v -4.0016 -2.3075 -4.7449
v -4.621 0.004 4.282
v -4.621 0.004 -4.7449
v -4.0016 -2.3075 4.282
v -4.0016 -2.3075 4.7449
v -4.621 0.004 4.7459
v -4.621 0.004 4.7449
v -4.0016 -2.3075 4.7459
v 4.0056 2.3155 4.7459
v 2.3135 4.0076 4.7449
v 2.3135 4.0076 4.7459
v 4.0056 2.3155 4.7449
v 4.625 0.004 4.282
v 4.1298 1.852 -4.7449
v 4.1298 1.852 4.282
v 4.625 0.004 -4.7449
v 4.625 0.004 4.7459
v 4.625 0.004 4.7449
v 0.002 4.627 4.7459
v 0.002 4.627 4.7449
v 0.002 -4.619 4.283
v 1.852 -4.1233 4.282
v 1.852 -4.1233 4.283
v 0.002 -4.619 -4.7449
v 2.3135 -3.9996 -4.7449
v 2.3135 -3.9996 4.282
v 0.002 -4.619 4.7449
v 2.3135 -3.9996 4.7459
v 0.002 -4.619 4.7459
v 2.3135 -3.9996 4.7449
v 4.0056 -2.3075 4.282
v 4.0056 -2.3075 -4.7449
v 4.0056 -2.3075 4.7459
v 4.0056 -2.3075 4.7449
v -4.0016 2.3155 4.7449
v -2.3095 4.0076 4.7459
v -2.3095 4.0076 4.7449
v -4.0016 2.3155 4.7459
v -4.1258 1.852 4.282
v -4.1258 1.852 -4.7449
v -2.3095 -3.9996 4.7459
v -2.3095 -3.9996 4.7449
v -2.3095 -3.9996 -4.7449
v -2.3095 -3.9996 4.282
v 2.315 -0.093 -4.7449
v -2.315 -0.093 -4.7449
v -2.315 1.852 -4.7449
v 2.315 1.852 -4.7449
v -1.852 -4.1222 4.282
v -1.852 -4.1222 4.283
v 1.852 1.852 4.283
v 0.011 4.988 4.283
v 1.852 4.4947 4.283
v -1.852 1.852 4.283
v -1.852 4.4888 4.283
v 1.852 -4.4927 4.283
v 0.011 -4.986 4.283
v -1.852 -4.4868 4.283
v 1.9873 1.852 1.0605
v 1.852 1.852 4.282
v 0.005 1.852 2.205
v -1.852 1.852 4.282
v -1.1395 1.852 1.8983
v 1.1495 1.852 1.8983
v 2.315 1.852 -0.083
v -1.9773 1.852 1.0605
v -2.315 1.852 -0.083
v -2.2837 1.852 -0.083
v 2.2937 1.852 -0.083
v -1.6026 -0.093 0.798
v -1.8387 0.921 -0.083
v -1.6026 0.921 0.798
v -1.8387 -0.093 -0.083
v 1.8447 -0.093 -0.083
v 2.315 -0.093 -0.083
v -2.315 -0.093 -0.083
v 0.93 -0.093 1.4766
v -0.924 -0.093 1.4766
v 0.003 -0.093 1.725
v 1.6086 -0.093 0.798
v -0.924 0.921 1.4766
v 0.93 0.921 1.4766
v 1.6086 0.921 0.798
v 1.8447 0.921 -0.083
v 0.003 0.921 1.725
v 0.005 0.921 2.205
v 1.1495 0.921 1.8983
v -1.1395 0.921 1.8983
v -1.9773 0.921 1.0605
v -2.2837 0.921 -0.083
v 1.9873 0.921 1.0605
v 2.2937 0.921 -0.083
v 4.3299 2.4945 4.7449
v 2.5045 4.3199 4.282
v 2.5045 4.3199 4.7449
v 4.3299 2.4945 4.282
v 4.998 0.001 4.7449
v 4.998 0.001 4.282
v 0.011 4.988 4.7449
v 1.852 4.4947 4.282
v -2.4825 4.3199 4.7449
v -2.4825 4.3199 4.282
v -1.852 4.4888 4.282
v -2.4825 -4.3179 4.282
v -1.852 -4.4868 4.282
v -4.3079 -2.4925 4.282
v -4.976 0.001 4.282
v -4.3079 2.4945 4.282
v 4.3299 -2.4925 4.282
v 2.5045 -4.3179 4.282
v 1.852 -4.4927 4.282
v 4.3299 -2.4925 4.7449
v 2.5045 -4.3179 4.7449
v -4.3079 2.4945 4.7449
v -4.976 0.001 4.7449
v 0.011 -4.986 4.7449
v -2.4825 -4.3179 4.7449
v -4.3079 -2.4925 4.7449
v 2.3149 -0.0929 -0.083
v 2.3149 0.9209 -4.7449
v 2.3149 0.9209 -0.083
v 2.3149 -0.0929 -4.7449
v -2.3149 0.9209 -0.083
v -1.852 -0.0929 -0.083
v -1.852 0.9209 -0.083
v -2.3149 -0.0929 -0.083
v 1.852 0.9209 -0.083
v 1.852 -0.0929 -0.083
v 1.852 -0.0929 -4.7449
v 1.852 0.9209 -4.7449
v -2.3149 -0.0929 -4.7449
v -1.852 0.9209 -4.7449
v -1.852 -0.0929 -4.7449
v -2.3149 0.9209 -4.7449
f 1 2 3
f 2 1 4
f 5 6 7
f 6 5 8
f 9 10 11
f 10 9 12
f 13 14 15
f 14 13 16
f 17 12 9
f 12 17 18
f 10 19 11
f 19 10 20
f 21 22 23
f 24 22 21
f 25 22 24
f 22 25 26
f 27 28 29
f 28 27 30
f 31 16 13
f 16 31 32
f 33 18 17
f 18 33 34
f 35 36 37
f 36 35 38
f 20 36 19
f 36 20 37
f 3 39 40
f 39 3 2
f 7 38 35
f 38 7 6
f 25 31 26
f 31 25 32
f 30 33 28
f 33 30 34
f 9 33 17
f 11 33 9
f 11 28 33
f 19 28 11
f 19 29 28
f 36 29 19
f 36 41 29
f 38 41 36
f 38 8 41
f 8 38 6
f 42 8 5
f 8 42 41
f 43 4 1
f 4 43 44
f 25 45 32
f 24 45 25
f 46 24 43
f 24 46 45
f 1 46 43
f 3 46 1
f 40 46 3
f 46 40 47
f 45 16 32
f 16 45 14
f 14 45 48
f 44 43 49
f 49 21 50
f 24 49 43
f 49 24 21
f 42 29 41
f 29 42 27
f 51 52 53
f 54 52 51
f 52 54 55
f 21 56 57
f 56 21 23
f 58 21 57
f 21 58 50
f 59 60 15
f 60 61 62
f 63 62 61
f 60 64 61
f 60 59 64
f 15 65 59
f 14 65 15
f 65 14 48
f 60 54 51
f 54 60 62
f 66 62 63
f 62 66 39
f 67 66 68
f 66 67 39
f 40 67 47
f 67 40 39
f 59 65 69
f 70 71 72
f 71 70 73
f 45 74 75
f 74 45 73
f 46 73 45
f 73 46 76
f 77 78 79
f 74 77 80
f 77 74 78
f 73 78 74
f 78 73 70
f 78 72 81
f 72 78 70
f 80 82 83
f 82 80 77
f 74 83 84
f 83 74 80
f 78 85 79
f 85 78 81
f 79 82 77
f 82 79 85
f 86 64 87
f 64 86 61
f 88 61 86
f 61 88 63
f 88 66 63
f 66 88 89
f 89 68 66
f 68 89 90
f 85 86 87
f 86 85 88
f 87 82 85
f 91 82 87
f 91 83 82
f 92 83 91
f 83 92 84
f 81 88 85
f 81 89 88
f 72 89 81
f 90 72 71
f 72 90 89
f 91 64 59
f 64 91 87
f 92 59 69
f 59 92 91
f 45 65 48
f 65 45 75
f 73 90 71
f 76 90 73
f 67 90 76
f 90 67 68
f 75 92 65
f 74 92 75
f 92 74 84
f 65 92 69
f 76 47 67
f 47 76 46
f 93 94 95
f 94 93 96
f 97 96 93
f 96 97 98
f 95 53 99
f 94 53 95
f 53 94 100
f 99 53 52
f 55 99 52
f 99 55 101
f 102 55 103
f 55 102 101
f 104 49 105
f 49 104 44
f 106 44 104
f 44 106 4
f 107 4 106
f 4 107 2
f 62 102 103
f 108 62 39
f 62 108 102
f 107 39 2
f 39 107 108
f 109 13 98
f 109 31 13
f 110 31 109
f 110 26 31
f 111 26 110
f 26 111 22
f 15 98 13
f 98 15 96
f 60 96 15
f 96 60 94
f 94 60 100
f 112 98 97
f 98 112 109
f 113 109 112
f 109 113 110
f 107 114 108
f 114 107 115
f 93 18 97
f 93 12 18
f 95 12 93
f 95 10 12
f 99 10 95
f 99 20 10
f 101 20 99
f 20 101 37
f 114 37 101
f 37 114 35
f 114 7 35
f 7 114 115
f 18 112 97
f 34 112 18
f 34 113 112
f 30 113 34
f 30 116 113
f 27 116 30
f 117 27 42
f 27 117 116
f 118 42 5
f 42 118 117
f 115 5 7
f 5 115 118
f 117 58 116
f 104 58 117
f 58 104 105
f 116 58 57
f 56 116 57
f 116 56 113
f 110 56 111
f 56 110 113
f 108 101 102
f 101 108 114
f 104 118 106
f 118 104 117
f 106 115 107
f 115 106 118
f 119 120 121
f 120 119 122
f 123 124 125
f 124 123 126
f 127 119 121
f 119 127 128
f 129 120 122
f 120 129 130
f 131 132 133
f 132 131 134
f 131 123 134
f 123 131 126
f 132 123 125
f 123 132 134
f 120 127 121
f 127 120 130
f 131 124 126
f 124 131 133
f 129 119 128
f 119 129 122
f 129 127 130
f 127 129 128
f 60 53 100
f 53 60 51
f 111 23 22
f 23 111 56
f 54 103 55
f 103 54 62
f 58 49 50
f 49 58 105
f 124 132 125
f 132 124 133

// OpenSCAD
intersection() {
  translate([0, 0, 0.0005])
  cube(size = [11.9999, 11.9999, 11.3889], center = true);

  union() {
    difference() {
      difference() {
        translate([0.002, 0.004, 0.0005])
        cylinder(h = 9.4909, r1 = 4.623, r2 = 4.623, center = true, $fn = 12);
      
        translate([0, 10.026, -0.231])
        cube(size = [36.4, 16.348, 9.028], center = true);
      }
    
      union() {
        translate([0.003, 0.879, -0.129])
        rotate([180, 90, -90])
        cylinder(h = 1.944, r1 = 1.854, r2 = 1.854, center = true, $fn = 12);
      
        translate([0.005, 9.5605, -0.084])
        rotate([180, 90, -90])
        cylinder(h = 17.279, r1 = 2.289, r2 = 2.289, center = true, $fn = 12);
      
        translate([0, 9.0535, -2.414])
        cube(size = [4.63, 18.293, 4.662], center = true);
      }
    }
  
    difference() {
      union() {
        translate([0.011, 0.001, 4.5135])
        cylinder(h = 0.4629, r1 = 4.987, r2 = 4.987, center = true, $fn = 12);
      
        translate([0, 0.414, -2.414])
        cube(size = [4.6299, 1.0139, 4.6619], center = true);
      }
    
      translate([0, 0, -0.231])
      cube(size = [3.704, 36.4, 9.028], center = true);
    }
  }
}
